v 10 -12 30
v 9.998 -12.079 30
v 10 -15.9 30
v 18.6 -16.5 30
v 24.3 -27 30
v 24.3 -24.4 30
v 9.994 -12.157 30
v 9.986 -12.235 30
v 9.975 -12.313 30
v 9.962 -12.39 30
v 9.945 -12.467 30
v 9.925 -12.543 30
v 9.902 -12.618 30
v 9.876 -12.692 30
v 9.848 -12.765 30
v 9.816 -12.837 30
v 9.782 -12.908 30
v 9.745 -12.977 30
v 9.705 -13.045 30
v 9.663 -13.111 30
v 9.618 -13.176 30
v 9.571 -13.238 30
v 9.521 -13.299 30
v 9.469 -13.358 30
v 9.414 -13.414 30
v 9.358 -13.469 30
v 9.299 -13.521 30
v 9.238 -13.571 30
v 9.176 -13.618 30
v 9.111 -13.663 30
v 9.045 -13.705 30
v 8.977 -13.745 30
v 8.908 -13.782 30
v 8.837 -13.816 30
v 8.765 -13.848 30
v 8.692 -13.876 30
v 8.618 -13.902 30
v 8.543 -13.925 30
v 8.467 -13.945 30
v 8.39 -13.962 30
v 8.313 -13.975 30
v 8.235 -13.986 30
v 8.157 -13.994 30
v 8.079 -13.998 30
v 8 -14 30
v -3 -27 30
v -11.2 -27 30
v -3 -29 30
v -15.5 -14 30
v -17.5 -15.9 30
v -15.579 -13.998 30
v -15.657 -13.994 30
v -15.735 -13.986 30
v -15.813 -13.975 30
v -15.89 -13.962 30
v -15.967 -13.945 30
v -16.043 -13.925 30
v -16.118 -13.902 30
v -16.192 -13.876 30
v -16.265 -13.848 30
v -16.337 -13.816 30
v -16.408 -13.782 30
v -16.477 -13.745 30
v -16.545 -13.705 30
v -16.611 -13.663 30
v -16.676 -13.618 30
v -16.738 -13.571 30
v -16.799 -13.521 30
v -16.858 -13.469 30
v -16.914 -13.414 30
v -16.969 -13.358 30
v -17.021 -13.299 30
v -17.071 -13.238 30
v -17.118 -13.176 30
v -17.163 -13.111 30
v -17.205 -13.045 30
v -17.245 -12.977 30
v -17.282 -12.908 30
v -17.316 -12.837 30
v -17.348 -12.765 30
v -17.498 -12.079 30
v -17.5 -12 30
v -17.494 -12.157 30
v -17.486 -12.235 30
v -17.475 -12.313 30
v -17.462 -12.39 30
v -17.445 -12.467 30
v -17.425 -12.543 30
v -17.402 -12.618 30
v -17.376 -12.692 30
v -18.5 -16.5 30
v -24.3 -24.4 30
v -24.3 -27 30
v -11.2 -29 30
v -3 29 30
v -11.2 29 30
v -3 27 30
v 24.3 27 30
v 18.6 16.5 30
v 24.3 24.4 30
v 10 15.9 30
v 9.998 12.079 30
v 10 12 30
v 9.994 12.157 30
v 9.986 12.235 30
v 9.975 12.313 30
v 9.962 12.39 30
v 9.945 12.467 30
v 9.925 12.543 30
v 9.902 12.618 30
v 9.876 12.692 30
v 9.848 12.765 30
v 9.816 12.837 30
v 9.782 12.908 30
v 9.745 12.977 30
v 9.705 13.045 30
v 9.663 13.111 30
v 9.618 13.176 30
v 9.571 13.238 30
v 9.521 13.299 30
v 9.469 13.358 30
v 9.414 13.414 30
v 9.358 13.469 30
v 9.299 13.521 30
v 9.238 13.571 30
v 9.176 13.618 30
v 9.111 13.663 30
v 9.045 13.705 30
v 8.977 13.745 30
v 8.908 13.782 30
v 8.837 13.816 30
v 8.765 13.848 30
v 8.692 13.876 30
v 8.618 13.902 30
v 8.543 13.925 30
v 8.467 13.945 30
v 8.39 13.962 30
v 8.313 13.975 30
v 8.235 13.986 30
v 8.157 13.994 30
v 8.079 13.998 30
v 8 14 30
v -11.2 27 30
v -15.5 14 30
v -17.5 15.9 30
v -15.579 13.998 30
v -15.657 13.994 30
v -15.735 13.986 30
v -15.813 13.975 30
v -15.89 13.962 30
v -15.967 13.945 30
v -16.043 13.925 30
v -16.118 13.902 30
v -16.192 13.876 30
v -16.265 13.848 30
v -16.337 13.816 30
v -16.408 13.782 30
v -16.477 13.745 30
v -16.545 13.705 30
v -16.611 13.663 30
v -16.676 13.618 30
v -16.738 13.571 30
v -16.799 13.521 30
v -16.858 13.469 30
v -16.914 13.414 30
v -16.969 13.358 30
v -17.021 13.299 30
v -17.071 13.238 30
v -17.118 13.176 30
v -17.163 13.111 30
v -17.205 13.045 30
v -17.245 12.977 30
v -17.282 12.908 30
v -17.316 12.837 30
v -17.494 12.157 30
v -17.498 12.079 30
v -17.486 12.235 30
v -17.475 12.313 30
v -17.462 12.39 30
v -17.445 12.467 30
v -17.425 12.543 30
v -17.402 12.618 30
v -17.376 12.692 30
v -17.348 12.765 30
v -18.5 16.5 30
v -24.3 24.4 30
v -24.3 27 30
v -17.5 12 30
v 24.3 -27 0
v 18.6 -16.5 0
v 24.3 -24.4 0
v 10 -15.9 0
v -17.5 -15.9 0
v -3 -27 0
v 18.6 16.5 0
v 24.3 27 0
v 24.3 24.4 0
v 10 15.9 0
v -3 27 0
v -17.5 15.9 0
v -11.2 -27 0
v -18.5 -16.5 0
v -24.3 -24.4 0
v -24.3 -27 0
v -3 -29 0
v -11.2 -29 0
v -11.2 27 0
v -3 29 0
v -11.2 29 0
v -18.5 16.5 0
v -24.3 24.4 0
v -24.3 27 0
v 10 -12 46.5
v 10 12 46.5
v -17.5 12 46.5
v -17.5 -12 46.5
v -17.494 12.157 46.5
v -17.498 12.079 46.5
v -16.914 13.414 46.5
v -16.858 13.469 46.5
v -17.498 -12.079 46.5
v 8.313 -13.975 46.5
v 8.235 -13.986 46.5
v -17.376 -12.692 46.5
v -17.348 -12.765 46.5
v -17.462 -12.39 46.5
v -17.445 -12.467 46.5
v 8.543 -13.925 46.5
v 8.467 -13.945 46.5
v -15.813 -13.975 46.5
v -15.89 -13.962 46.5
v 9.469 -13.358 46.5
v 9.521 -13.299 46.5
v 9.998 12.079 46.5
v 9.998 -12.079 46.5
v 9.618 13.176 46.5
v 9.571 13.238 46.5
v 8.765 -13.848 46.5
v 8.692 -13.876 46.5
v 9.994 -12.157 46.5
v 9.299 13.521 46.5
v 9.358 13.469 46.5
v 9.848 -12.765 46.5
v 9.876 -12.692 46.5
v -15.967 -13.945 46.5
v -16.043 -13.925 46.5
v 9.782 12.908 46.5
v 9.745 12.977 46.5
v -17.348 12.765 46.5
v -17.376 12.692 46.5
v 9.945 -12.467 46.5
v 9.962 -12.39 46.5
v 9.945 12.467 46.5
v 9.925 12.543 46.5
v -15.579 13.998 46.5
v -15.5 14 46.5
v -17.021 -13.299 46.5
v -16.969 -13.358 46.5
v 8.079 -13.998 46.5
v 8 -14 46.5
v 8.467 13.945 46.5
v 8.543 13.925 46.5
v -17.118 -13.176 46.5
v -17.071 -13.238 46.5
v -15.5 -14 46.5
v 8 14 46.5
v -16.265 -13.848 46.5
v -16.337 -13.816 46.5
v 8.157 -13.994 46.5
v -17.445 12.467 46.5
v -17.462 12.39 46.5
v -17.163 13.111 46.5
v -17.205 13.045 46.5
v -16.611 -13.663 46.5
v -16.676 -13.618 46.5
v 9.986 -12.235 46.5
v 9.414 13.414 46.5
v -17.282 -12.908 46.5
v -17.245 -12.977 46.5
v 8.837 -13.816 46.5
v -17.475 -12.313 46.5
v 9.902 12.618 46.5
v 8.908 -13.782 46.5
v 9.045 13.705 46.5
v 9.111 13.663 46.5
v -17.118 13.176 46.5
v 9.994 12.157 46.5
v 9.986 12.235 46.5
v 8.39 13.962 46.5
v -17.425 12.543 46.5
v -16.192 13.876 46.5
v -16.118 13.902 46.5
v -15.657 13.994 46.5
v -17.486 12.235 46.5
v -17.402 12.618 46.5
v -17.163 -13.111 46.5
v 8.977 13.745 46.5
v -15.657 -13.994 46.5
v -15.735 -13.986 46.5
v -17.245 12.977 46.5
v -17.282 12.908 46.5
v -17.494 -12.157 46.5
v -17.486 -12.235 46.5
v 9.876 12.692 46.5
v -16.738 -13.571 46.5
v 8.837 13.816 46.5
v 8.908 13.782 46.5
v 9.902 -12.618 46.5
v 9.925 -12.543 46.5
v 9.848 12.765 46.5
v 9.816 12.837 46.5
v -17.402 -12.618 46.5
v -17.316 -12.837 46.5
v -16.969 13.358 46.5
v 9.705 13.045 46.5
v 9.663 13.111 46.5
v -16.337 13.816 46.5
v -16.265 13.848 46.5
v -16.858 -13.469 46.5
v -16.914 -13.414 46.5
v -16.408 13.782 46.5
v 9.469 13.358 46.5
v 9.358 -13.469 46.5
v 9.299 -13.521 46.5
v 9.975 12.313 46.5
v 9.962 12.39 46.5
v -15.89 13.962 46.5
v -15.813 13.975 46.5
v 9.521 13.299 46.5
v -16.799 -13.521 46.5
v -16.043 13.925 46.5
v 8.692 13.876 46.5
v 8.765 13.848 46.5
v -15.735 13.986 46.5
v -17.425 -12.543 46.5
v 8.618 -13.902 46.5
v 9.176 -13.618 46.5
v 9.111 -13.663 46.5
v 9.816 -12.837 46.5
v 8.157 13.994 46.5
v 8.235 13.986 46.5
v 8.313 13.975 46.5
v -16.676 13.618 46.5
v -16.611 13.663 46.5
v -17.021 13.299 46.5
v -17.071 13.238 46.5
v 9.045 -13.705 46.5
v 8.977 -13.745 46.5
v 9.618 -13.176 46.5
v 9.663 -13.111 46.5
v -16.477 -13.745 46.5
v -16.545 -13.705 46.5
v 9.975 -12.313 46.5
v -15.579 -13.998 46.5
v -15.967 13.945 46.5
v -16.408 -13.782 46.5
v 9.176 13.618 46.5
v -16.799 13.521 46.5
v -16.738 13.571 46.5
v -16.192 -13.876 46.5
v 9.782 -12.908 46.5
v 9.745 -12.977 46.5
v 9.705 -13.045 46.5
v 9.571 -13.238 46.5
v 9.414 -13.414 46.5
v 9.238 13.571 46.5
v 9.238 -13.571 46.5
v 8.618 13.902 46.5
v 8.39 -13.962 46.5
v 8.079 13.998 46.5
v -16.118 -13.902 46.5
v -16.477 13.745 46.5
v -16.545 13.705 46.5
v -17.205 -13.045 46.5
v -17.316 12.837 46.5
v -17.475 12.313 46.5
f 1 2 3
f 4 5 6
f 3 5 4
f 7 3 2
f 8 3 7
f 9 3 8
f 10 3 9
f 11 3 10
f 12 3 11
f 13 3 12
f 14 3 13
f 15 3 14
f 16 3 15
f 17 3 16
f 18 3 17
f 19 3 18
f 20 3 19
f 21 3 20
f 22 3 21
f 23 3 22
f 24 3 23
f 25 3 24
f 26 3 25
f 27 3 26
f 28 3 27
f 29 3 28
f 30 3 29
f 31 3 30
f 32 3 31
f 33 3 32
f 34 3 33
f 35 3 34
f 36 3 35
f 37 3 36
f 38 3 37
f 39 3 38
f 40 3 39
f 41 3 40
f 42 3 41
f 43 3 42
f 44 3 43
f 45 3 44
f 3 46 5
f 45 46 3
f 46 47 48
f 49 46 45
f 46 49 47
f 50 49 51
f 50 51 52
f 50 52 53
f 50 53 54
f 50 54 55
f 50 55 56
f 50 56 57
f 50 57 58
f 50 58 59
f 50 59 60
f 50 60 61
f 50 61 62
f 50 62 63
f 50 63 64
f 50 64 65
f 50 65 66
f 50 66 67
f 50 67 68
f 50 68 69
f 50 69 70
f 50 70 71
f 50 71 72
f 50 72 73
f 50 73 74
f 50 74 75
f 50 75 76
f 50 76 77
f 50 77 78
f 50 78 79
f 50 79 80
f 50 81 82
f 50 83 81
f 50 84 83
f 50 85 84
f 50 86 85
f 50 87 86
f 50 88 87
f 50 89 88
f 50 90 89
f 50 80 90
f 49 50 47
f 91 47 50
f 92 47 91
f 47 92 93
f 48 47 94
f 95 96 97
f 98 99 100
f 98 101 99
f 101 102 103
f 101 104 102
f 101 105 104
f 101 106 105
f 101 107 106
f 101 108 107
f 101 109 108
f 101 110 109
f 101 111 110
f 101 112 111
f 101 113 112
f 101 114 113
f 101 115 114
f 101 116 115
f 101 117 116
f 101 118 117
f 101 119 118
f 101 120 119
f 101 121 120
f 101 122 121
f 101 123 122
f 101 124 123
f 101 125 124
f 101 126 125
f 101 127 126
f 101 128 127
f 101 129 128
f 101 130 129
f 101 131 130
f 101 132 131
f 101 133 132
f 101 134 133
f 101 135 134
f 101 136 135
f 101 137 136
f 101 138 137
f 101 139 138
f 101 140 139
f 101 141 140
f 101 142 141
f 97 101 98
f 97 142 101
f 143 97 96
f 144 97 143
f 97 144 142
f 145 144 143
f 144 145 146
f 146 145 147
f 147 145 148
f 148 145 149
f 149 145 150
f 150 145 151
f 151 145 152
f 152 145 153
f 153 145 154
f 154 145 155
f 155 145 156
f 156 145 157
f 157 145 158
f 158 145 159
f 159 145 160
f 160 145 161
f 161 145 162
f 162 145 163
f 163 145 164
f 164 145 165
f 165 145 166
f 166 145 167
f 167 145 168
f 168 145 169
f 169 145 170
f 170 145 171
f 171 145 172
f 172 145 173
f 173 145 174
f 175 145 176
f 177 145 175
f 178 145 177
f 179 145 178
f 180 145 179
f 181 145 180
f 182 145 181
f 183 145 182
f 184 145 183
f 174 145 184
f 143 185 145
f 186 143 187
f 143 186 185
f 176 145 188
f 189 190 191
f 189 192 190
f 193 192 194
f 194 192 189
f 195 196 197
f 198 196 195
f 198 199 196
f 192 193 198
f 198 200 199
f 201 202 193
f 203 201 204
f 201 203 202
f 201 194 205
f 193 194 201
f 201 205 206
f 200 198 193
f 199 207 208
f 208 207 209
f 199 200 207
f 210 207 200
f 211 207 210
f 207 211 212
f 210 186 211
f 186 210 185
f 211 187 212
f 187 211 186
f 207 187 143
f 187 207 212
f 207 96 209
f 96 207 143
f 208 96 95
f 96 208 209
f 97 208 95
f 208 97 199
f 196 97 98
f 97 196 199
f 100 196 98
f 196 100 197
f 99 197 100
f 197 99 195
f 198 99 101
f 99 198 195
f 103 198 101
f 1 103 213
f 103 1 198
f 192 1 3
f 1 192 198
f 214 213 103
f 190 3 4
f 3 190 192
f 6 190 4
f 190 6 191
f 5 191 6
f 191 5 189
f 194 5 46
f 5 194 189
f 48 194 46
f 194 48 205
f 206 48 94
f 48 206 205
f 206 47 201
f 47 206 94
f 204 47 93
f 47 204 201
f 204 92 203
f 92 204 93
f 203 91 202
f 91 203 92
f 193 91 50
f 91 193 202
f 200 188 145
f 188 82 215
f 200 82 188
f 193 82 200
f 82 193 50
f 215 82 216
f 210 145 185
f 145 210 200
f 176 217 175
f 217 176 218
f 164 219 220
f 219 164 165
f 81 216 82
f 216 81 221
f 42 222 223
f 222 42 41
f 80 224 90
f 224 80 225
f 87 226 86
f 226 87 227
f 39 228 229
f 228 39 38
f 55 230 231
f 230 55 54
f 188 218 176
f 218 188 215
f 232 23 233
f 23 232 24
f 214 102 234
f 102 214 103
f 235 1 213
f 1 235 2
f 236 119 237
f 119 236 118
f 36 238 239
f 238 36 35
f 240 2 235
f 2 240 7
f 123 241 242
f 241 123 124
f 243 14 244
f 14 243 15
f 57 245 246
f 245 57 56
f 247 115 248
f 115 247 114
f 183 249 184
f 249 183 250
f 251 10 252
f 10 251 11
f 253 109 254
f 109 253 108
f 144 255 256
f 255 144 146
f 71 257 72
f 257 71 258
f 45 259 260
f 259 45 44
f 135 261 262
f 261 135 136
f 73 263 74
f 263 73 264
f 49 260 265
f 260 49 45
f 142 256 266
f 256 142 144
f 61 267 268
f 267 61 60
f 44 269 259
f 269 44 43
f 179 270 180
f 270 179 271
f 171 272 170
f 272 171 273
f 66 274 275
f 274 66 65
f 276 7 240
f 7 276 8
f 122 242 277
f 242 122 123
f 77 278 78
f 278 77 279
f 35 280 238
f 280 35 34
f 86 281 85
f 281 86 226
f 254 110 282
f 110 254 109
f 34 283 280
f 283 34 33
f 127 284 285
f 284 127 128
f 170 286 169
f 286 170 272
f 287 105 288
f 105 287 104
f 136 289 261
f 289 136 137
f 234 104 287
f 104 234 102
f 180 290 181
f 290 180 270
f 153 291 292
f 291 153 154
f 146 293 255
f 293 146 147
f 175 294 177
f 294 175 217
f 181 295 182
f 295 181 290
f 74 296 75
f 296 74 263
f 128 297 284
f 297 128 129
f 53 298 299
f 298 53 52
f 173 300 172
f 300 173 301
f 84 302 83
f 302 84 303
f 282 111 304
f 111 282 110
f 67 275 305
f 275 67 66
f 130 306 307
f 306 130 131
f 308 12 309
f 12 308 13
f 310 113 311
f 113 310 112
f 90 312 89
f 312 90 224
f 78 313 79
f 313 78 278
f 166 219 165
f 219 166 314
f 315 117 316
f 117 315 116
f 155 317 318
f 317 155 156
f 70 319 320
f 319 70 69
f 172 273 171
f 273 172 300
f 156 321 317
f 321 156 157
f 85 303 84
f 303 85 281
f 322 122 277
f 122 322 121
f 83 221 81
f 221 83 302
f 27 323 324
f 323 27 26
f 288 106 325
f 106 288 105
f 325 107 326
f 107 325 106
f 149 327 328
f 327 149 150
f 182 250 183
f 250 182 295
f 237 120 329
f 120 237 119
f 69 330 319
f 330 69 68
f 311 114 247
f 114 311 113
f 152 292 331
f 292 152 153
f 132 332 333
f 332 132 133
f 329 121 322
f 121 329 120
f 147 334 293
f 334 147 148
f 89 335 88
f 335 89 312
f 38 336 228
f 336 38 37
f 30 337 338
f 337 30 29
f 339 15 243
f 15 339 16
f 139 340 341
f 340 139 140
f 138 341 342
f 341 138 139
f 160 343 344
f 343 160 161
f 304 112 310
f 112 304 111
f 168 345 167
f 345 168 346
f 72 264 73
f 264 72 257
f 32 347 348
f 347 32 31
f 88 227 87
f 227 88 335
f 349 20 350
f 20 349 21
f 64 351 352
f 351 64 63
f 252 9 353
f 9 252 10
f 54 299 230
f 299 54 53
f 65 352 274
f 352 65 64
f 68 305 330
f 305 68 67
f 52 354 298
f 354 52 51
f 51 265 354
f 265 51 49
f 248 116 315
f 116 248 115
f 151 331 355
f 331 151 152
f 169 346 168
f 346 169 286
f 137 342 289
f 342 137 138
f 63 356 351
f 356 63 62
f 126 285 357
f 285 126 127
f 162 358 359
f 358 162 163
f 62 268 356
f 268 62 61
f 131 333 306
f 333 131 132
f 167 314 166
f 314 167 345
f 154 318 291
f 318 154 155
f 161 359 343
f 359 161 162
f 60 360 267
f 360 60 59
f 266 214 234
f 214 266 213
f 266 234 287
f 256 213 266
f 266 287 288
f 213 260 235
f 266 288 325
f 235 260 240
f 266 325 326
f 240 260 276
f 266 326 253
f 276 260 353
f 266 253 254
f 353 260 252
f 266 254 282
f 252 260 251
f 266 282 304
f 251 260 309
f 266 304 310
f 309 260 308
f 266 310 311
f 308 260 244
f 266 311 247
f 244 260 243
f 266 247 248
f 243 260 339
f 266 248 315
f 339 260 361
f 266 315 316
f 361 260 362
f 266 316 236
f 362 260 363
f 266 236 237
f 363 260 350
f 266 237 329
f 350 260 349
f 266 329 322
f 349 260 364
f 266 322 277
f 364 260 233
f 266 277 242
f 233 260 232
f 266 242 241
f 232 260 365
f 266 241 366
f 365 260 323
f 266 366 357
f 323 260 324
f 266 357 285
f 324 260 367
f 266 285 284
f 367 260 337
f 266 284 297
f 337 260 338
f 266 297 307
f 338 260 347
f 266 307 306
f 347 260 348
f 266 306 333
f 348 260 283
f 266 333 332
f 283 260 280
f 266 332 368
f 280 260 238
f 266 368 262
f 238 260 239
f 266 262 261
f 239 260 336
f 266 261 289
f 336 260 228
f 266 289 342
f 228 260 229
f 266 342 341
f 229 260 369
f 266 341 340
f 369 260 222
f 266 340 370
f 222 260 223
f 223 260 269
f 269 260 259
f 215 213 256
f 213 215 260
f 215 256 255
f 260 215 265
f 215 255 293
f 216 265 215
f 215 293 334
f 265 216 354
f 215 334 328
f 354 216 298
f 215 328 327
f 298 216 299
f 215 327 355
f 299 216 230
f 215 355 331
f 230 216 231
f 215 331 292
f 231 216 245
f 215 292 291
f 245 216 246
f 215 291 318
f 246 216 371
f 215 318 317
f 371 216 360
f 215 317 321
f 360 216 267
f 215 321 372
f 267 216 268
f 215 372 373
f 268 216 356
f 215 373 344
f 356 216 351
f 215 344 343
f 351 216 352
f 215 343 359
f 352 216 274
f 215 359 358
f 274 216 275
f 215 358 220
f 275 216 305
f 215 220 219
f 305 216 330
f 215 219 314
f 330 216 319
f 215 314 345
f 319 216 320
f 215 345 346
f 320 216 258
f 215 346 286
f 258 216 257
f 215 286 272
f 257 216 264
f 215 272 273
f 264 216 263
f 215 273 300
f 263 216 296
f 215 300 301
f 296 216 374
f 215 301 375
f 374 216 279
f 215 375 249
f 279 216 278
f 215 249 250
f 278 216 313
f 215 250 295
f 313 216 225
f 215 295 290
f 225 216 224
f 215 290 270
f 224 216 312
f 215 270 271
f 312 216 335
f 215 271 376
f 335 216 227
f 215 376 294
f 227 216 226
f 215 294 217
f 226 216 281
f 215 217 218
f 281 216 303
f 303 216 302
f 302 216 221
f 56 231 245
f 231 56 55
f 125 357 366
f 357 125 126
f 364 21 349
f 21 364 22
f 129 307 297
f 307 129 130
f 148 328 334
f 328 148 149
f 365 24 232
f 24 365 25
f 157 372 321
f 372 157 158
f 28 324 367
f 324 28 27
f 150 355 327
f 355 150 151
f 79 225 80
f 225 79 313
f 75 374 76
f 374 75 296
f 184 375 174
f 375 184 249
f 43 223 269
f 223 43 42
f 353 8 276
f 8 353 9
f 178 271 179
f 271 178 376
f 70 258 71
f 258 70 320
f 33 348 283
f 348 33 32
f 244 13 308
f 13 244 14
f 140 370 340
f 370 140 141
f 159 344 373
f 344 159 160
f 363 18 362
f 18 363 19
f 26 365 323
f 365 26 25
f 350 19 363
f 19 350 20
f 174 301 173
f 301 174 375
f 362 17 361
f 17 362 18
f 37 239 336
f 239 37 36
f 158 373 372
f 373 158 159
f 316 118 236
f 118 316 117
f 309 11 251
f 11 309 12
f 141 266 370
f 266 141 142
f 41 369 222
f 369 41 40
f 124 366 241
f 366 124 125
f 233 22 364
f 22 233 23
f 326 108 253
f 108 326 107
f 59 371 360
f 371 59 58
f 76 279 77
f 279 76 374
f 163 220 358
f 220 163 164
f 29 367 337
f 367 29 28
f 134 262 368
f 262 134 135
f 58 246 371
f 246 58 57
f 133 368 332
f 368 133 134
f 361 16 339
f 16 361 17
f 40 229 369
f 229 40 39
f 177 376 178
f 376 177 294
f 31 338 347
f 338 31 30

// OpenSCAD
/* tie-punisher-bin.scad
 *
 * Copyright (C) Robert B. Ross, 2016
 *
 * This software is released under the Creative Commons Attribution
 * Non-Commercial License. It is derived from the model by RonPossible:
 * as downloaded on 4/29/2016 from the following URL:
 * http://www.thingiverse.com/thing:1377445
 *
 * Specifically, the outline of the Punisher was extracted from 
 * RonPossible's model.
 */

include <./bintools.scad>

$fn=160;
binHeight = 46.5;
angle=0;

/* locations is a pair of triples, translate : rotate pairs
 */
locations = [[[0,9,0], [0,0,0]]];

// harborFreightMediumFullHt(locations,inset=1) punisherBlank();

punisherBlank();
// punisherOutline();

/* punisherOutline() -- test piece for outline
 */
module punisherOutline() {
   testHeight = 40; // should be more than blankHeight, below.

   translate([0,0,testHeight]) rotate([180,0,0]) {
      blankCutout(height=testHeight - 0.1, outlineScale=1.2) punisherBlank();
   }
}

module punisherBlank(centerCutout=1) {
   blankHeight = 30; 
   
   /* rotate, etc. positions blank upside-down on XY plane */
   rotate([180,0,0]) translate([0,0,-binHeight]) union() {
      difference() {
         translate([0,0,binHeight- (blankHeight)])
            linear_extrude(height=blankHeight) punisherShell();
      }
      if (centerCutout) linear_extrude(height=binHeight) centerCutoutPoly();
   } /* rotate, translate, union */
}

/* punisherShell() -- outline */
module punisherShell() {
   for (i=[0:1]) mirror([0,i,0]) 
      polygon([[10,0],[10,-15.9],[18.6,-16.5],[24.3,-24.4],[24.3,-27],
               [-3,-27],[-3,-29], [-11.2,-29],[-11.2,-27],[-24.3,-27],
               [-24.3,-24.4],[-18.5,-16.5],[-17.5,-15.9], [-17.5,0]]);
}

/* centerCutoutPoly() -- defines a polygon to be cut all the way to the
 *                       bottom of the bin.
 */
module centerCutoutPoly() {
   hull() {
      translate([-15.5,-12,0]) circle(r=2);
      translate([8,12,0]) circle(r=2);
      translate([-15.5,12,0]) circle(r=2);
      translate([8,-12,0]) circle(r=2);
   }
}

/*
 * Local variables:
 *  mode: C
 *  c-indent-level: 3
 *  c-basic-offset: 3
 * End:
 *
 * vim: ts=8 sts=3 sw=3 expandtab
 */
